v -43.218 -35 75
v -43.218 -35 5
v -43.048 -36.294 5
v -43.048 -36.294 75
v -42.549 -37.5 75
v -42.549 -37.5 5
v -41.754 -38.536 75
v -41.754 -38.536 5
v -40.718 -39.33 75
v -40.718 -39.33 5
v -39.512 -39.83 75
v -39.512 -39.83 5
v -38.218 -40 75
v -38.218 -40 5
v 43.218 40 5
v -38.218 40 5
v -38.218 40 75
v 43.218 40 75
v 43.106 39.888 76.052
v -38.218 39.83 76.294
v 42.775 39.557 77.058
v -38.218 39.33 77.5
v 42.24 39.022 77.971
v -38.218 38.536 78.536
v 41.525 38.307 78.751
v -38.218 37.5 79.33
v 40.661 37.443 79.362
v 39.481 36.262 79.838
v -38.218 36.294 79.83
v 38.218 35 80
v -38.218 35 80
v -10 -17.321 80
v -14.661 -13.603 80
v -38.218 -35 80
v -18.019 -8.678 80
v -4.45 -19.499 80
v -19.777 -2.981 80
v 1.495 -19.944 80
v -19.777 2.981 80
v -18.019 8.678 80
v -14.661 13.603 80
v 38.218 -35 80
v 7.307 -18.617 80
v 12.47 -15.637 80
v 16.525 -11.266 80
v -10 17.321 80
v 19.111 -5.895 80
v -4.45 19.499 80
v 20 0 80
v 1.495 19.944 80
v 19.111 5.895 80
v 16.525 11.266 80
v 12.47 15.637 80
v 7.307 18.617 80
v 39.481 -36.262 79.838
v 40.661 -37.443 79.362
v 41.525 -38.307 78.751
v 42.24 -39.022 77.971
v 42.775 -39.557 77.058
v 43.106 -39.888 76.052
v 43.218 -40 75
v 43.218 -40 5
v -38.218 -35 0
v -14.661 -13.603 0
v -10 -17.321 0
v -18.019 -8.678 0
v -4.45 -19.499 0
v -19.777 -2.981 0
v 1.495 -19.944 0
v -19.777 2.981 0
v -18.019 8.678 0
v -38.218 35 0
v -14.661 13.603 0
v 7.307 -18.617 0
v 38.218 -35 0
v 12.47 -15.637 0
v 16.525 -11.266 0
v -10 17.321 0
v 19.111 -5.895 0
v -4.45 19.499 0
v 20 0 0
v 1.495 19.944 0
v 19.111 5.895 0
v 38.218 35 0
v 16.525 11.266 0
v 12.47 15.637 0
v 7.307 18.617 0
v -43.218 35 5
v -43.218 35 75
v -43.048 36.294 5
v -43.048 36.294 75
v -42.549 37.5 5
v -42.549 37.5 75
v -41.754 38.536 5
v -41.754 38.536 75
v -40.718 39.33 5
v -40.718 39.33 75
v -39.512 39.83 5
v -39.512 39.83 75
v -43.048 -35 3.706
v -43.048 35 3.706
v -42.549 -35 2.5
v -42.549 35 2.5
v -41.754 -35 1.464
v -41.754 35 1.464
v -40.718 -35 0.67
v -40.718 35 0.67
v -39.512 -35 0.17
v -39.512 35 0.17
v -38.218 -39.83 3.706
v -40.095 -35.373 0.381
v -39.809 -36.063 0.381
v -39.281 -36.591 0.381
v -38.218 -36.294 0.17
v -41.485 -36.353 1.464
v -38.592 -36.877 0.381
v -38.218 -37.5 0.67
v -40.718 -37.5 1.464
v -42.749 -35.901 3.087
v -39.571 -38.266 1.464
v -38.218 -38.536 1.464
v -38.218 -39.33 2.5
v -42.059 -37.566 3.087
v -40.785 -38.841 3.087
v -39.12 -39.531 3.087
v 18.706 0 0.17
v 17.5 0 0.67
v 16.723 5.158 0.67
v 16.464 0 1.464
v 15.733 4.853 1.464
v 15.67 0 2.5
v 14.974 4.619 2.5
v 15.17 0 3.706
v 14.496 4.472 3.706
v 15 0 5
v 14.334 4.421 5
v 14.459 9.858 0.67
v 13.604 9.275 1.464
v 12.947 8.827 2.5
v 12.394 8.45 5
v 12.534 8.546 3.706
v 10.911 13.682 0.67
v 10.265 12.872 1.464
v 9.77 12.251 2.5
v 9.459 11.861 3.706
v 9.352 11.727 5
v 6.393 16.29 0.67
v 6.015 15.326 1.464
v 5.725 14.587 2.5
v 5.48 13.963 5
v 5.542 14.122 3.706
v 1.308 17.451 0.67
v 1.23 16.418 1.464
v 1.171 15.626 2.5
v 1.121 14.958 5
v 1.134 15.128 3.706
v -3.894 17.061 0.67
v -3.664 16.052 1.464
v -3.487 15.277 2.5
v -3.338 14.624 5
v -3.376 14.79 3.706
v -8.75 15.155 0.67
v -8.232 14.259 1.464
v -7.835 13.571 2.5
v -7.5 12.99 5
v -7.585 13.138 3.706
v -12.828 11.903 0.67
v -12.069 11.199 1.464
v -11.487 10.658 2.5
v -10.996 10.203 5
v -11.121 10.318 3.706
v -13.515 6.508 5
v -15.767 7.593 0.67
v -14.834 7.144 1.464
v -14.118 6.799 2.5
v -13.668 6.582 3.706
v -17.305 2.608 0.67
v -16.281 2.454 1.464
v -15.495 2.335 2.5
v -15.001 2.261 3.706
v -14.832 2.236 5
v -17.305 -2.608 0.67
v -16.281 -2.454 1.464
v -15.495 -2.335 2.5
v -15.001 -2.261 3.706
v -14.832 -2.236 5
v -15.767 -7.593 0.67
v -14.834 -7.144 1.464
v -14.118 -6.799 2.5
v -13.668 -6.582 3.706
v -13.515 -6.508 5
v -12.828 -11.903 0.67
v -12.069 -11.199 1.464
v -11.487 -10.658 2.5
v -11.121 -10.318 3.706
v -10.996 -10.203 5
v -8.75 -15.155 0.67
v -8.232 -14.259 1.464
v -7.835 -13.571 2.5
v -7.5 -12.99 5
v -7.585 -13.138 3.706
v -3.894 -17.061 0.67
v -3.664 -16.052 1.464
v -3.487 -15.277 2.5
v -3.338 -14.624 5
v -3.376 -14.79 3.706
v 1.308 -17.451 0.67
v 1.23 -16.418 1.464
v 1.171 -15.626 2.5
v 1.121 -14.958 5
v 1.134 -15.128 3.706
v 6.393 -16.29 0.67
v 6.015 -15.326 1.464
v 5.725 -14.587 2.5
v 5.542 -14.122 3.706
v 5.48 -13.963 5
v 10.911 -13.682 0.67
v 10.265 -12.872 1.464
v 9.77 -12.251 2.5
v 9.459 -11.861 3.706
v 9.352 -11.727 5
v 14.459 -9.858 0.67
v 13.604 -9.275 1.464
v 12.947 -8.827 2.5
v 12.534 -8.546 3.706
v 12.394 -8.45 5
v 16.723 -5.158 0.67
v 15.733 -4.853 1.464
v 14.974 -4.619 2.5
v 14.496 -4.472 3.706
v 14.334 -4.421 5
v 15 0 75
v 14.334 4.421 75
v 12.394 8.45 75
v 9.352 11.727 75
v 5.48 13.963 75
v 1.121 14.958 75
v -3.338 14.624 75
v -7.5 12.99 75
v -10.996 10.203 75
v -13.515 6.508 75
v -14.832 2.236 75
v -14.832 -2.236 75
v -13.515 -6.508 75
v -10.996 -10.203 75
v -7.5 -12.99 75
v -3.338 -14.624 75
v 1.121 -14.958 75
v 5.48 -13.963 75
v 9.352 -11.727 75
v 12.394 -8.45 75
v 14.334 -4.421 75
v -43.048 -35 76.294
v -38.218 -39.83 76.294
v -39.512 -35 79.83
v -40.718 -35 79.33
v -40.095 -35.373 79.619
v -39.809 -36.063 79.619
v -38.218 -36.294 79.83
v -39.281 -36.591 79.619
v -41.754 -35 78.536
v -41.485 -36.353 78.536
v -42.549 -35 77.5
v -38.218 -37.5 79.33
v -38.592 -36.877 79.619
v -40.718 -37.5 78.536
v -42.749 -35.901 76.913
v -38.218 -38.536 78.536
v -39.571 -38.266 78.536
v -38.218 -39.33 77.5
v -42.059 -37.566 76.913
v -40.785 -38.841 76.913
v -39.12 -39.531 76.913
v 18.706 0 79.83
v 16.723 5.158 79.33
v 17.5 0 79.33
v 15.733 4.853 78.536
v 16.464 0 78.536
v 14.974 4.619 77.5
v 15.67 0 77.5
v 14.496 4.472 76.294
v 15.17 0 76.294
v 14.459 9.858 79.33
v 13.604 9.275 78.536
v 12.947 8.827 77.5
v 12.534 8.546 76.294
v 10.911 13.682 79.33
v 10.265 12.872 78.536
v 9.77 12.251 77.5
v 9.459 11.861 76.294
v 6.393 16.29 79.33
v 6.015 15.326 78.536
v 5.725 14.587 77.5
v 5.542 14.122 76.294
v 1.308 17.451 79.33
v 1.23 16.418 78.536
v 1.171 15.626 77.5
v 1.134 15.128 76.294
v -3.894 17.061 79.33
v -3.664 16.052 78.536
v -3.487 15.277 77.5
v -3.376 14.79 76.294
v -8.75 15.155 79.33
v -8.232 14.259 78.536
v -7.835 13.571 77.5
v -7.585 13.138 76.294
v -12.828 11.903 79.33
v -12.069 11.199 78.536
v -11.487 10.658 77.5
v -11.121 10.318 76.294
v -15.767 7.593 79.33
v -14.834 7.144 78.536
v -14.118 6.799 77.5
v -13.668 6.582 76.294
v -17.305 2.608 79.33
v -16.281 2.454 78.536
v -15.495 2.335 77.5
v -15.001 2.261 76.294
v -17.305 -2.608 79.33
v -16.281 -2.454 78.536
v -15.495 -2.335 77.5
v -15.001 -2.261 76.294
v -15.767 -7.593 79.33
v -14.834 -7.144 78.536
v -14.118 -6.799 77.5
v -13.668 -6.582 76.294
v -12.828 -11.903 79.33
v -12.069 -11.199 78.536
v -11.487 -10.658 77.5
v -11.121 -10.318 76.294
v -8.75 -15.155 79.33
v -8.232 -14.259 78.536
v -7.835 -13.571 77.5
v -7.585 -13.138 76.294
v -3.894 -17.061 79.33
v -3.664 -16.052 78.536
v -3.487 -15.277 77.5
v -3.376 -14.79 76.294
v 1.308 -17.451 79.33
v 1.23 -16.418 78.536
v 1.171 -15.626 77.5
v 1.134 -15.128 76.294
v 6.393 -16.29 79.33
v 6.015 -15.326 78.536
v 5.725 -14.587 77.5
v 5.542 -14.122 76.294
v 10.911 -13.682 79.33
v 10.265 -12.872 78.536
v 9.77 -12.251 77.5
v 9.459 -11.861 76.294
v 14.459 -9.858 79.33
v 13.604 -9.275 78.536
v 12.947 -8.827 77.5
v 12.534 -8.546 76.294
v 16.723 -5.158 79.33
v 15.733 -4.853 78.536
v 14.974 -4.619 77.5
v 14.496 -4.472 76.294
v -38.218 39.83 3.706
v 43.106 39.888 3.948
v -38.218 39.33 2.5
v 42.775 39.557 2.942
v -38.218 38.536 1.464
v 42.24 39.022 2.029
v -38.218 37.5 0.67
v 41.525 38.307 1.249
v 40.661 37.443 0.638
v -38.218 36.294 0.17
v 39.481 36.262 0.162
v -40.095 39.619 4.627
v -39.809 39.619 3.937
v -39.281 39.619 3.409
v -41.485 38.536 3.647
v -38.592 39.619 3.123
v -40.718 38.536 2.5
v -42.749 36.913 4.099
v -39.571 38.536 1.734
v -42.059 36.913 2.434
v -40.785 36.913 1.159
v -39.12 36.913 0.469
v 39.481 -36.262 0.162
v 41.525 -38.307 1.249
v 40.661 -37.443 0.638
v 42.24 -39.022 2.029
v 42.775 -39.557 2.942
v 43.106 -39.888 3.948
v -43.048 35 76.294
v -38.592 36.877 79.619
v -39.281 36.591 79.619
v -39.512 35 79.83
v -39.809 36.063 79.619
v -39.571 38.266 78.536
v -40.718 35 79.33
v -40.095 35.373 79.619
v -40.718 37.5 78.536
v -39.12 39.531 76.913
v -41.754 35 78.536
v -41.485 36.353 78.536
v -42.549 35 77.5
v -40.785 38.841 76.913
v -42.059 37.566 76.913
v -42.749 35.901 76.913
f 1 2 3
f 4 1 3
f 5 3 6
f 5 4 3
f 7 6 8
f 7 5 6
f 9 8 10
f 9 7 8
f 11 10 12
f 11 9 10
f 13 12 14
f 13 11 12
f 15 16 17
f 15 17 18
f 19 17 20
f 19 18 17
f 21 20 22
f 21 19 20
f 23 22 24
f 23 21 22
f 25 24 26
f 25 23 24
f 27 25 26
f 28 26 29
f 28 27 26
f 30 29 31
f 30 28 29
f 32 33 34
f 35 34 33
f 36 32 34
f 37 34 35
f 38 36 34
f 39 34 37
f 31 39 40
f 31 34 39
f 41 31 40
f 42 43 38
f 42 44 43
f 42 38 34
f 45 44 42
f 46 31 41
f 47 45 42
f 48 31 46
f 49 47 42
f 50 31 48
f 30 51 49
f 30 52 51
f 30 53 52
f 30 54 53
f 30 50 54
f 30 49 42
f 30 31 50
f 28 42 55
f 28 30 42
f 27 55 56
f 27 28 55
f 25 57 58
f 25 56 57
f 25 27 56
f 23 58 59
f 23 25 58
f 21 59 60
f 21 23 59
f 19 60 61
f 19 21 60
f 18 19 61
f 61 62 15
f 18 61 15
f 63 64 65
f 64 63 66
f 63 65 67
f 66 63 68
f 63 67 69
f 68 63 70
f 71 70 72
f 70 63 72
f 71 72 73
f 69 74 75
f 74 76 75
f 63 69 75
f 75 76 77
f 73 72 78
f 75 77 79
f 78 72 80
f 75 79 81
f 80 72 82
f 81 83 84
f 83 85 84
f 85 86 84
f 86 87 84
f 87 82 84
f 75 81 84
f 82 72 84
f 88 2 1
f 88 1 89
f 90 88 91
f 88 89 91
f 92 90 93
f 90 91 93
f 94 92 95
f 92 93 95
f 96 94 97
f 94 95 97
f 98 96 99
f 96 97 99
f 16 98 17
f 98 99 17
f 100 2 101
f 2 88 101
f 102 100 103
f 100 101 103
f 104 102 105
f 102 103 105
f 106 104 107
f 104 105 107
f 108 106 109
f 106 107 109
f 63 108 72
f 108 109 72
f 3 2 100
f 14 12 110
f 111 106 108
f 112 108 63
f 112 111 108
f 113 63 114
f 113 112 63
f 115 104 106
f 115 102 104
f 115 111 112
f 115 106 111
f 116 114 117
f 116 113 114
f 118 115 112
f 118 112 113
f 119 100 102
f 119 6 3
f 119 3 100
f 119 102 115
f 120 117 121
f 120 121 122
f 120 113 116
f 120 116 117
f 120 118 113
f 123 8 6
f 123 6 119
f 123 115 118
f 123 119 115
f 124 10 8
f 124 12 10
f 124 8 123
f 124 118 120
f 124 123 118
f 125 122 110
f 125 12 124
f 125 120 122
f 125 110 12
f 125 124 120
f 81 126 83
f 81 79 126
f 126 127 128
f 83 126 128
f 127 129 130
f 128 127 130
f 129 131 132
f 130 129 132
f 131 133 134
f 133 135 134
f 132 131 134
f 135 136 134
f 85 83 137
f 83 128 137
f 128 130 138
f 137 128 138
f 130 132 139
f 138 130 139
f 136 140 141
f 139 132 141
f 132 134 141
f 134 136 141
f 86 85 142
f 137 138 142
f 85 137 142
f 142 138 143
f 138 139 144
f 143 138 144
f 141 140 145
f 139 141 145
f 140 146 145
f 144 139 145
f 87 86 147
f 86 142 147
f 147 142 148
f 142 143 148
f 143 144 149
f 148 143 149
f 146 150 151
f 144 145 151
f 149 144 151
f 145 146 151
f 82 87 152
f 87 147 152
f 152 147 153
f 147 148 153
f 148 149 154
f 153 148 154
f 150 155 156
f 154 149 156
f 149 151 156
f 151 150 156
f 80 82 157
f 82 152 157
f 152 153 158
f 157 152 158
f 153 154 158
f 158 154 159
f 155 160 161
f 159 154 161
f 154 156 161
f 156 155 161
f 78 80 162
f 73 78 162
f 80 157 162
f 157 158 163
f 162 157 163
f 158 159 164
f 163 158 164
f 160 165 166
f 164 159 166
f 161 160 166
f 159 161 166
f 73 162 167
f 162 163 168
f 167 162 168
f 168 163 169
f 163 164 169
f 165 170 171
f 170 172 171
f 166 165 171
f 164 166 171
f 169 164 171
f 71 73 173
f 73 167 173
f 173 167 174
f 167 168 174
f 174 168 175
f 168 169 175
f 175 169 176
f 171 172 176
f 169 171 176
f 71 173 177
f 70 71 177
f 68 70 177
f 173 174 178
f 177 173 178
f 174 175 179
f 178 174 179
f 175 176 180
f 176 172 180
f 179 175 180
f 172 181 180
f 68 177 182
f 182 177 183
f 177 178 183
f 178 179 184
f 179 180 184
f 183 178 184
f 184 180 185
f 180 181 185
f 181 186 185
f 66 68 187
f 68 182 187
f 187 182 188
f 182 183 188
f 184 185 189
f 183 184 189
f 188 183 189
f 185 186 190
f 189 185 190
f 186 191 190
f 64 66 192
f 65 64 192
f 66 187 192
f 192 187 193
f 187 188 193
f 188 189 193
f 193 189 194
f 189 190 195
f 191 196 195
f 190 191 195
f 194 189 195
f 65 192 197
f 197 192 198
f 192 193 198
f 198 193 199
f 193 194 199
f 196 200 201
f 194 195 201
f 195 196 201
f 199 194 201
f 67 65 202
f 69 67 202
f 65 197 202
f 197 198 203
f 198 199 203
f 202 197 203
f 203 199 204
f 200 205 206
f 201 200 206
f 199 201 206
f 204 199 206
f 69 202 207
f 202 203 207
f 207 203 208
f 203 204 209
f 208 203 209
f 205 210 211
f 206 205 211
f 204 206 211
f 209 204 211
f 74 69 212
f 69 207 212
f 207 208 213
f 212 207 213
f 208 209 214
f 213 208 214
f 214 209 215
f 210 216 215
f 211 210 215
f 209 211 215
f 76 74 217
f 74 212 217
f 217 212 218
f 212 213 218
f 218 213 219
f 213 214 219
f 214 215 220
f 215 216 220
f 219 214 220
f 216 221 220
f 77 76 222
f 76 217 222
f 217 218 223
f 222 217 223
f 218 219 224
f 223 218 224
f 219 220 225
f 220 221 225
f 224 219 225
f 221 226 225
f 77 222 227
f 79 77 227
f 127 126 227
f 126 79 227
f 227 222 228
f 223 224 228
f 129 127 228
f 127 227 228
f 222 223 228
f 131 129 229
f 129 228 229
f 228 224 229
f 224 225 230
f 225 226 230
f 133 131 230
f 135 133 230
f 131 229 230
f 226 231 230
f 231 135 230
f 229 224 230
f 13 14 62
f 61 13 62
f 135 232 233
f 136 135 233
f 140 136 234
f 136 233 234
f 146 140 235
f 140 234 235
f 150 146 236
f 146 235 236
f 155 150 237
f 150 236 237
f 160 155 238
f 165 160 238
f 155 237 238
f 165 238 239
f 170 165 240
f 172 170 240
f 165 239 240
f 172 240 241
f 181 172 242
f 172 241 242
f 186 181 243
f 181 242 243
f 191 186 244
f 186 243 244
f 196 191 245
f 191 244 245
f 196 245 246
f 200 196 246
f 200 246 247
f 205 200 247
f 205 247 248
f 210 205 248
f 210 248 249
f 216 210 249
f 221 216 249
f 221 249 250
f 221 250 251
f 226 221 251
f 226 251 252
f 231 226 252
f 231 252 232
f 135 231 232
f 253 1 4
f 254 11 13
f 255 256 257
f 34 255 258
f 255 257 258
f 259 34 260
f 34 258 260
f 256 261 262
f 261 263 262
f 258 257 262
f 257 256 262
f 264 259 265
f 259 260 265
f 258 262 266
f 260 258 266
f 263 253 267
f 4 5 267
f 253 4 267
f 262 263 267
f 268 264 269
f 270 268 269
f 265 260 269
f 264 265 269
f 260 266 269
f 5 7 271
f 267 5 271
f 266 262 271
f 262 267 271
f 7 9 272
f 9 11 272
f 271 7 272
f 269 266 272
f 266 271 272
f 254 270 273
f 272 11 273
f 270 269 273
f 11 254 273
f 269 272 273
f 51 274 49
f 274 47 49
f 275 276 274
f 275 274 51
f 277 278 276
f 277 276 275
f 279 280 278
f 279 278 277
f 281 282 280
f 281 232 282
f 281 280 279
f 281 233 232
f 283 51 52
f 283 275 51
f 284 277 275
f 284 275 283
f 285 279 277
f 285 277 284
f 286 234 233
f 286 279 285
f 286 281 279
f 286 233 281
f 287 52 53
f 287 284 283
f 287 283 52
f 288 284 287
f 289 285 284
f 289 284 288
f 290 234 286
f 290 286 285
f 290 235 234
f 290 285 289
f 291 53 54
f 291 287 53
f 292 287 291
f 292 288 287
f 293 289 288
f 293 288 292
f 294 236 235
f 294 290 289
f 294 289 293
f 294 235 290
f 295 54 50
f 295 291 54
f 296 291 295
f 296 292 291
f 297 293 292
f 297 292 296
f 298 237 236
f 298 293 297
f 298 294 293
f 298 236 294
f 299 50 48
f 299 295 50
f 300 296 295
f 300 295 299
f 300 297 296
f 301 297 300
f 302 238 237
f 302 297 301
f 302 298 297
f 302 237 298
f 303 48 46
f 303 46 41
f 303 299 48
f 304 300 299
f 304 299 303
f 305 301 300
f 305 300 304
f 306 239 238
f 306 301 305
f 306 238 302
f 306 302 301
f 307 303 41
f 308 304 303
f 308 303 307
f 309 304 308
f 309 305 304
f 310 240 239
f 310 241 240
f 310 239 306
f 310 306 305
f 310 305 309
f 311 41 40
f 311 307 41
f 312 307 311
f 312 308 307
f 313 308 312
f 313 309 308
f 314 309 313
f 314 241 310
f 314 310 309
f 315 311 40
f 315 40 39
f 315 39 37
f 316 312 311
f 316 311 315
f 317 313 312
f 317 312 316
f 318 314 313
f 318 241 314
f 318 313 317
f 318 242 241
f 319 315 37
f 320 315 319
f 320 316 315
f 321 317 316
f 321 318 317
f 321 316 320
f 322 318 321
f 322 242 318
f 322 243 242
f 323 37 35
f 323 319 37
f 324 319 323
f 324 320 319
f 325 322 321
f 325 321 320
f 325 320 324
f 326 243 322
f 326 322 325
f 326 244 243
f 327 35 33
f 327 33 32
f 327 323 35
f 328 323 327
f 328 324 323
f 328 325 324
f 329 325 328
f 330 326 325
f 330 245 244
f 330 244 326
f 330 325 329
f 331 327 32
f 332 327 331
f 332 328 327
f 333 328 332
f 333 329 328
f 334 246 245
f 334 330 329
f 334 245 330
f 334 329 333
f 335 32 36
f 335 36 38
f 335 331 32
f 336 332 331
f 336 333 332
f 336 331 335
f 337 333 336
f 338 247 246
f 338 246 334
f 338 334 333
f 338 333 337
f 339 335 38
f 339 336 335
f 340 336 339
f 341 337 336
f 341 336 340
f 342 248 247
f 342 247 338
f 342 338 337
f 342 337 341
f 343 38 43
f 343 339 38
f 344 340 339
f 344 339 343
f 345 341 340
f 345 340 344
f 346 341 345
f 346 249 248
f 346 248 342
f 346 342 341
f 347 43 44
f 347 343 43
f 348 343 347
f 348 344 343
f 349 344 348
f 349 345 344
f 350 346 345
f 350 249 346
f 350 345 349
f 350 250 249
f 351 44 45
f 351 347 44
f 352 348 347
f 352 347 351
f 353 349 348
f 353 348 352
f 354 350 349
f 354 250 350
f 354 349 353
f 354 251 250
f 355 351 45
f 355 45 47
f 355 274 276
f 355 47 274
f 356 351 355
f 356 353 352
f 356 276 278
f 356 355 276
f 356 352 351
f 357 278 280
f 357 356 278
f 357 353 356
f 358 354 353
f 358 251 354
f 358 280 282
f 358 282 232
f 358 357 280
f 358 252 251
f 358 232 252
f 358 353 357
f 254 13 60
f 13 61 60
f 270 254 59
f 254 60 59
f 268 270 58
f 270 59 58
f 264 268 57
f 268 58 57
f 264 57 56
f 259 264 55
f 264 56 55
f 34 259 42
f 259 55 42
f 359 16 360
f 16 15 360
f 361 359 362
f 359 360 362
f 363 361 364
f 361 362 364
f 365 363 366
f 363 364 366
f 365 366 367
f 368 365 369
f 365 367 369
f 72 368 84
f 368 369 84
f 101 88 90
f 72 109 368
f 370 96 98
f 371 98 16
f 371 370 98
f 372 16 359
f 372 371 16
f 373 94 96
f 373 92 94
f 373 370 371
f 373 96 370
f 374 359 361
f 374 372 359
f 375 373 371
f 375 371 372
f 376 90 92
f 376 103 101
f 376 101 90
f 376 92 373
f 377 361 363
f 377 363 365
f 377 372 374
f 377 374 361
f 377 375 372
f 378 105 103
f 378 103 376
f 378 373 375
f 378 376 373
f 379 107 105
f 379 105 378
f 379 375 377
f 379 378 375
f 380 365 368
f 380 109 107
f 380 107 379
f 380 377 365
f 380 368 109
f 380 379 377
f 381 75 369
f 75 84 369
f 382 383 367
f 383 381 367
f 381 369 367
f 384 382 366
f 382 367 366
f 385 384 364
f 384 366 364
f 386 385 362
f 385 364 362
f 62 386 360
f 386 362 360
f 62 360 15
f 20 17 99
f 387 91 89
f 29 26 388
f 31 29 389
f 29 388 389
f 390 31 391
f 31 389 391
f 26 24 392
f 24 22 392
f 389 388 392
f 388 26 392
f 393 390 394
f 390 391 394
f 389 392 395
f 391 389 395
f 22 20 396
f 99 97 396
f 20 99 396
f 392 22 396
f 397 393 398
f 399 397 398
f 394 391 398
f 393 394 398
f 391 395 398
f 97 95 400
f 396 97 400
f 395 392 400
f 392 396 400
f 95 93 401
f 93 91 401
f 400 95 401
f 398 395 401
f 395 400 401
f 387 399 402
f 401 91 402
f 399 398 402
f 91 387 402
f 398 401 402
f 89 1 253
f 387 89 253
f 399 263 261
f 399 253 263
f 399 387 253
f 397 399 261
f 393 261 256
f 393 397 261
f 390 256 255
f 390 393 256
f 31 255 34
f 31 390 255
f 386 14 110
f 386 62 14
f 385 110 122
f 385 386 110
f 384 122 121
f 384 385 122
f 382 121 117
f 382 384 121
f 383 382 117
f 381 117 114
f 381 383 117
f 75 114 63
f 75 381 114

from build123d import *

# Parameters (mm, degrees)
F0_W     = 86.436784
F0_H     = 80
F1_DEPTH = 80
F2_R     = 15
F3_DEPTH = 80.001
F4_R     = 5


with BuildPart() as f1:
    # F0 (on Top) → F1 (new body)
    with BuildSketch(Plane.XY):
        Rectangle(F0_W, F0_H)
    extrude(amount=F1_DEPTH)

    # F2 (on face) → F3 (cut, through all)
    with BuildSketch(Plane.XY.offset(80)):
        Circle(F2_R)
    extrude(amount=-F3_DEPTH, mode=Mode.SUBTRACT)

    # F4
    f4_edges = [f1.edges().sort_by_distance(p)[0] for p in [
        (-43.218392, -40, 40),
        (-43.218392, 0, 0),
        (-43.218392, 40, 40),
        (0, -40, 0),
        (0, 40, 0),
        (43.218392, 0, 0),
        (0, 40, 80),
        (-43.218392, 0, 80),
        (0, -40, 80),
        (43.218392, 0, 80),
        (-15, 0, 80),
        (-15, 0, 0),
    ]]
    fillet(f4_edges, radius=F4_R)


solid = f1.part
